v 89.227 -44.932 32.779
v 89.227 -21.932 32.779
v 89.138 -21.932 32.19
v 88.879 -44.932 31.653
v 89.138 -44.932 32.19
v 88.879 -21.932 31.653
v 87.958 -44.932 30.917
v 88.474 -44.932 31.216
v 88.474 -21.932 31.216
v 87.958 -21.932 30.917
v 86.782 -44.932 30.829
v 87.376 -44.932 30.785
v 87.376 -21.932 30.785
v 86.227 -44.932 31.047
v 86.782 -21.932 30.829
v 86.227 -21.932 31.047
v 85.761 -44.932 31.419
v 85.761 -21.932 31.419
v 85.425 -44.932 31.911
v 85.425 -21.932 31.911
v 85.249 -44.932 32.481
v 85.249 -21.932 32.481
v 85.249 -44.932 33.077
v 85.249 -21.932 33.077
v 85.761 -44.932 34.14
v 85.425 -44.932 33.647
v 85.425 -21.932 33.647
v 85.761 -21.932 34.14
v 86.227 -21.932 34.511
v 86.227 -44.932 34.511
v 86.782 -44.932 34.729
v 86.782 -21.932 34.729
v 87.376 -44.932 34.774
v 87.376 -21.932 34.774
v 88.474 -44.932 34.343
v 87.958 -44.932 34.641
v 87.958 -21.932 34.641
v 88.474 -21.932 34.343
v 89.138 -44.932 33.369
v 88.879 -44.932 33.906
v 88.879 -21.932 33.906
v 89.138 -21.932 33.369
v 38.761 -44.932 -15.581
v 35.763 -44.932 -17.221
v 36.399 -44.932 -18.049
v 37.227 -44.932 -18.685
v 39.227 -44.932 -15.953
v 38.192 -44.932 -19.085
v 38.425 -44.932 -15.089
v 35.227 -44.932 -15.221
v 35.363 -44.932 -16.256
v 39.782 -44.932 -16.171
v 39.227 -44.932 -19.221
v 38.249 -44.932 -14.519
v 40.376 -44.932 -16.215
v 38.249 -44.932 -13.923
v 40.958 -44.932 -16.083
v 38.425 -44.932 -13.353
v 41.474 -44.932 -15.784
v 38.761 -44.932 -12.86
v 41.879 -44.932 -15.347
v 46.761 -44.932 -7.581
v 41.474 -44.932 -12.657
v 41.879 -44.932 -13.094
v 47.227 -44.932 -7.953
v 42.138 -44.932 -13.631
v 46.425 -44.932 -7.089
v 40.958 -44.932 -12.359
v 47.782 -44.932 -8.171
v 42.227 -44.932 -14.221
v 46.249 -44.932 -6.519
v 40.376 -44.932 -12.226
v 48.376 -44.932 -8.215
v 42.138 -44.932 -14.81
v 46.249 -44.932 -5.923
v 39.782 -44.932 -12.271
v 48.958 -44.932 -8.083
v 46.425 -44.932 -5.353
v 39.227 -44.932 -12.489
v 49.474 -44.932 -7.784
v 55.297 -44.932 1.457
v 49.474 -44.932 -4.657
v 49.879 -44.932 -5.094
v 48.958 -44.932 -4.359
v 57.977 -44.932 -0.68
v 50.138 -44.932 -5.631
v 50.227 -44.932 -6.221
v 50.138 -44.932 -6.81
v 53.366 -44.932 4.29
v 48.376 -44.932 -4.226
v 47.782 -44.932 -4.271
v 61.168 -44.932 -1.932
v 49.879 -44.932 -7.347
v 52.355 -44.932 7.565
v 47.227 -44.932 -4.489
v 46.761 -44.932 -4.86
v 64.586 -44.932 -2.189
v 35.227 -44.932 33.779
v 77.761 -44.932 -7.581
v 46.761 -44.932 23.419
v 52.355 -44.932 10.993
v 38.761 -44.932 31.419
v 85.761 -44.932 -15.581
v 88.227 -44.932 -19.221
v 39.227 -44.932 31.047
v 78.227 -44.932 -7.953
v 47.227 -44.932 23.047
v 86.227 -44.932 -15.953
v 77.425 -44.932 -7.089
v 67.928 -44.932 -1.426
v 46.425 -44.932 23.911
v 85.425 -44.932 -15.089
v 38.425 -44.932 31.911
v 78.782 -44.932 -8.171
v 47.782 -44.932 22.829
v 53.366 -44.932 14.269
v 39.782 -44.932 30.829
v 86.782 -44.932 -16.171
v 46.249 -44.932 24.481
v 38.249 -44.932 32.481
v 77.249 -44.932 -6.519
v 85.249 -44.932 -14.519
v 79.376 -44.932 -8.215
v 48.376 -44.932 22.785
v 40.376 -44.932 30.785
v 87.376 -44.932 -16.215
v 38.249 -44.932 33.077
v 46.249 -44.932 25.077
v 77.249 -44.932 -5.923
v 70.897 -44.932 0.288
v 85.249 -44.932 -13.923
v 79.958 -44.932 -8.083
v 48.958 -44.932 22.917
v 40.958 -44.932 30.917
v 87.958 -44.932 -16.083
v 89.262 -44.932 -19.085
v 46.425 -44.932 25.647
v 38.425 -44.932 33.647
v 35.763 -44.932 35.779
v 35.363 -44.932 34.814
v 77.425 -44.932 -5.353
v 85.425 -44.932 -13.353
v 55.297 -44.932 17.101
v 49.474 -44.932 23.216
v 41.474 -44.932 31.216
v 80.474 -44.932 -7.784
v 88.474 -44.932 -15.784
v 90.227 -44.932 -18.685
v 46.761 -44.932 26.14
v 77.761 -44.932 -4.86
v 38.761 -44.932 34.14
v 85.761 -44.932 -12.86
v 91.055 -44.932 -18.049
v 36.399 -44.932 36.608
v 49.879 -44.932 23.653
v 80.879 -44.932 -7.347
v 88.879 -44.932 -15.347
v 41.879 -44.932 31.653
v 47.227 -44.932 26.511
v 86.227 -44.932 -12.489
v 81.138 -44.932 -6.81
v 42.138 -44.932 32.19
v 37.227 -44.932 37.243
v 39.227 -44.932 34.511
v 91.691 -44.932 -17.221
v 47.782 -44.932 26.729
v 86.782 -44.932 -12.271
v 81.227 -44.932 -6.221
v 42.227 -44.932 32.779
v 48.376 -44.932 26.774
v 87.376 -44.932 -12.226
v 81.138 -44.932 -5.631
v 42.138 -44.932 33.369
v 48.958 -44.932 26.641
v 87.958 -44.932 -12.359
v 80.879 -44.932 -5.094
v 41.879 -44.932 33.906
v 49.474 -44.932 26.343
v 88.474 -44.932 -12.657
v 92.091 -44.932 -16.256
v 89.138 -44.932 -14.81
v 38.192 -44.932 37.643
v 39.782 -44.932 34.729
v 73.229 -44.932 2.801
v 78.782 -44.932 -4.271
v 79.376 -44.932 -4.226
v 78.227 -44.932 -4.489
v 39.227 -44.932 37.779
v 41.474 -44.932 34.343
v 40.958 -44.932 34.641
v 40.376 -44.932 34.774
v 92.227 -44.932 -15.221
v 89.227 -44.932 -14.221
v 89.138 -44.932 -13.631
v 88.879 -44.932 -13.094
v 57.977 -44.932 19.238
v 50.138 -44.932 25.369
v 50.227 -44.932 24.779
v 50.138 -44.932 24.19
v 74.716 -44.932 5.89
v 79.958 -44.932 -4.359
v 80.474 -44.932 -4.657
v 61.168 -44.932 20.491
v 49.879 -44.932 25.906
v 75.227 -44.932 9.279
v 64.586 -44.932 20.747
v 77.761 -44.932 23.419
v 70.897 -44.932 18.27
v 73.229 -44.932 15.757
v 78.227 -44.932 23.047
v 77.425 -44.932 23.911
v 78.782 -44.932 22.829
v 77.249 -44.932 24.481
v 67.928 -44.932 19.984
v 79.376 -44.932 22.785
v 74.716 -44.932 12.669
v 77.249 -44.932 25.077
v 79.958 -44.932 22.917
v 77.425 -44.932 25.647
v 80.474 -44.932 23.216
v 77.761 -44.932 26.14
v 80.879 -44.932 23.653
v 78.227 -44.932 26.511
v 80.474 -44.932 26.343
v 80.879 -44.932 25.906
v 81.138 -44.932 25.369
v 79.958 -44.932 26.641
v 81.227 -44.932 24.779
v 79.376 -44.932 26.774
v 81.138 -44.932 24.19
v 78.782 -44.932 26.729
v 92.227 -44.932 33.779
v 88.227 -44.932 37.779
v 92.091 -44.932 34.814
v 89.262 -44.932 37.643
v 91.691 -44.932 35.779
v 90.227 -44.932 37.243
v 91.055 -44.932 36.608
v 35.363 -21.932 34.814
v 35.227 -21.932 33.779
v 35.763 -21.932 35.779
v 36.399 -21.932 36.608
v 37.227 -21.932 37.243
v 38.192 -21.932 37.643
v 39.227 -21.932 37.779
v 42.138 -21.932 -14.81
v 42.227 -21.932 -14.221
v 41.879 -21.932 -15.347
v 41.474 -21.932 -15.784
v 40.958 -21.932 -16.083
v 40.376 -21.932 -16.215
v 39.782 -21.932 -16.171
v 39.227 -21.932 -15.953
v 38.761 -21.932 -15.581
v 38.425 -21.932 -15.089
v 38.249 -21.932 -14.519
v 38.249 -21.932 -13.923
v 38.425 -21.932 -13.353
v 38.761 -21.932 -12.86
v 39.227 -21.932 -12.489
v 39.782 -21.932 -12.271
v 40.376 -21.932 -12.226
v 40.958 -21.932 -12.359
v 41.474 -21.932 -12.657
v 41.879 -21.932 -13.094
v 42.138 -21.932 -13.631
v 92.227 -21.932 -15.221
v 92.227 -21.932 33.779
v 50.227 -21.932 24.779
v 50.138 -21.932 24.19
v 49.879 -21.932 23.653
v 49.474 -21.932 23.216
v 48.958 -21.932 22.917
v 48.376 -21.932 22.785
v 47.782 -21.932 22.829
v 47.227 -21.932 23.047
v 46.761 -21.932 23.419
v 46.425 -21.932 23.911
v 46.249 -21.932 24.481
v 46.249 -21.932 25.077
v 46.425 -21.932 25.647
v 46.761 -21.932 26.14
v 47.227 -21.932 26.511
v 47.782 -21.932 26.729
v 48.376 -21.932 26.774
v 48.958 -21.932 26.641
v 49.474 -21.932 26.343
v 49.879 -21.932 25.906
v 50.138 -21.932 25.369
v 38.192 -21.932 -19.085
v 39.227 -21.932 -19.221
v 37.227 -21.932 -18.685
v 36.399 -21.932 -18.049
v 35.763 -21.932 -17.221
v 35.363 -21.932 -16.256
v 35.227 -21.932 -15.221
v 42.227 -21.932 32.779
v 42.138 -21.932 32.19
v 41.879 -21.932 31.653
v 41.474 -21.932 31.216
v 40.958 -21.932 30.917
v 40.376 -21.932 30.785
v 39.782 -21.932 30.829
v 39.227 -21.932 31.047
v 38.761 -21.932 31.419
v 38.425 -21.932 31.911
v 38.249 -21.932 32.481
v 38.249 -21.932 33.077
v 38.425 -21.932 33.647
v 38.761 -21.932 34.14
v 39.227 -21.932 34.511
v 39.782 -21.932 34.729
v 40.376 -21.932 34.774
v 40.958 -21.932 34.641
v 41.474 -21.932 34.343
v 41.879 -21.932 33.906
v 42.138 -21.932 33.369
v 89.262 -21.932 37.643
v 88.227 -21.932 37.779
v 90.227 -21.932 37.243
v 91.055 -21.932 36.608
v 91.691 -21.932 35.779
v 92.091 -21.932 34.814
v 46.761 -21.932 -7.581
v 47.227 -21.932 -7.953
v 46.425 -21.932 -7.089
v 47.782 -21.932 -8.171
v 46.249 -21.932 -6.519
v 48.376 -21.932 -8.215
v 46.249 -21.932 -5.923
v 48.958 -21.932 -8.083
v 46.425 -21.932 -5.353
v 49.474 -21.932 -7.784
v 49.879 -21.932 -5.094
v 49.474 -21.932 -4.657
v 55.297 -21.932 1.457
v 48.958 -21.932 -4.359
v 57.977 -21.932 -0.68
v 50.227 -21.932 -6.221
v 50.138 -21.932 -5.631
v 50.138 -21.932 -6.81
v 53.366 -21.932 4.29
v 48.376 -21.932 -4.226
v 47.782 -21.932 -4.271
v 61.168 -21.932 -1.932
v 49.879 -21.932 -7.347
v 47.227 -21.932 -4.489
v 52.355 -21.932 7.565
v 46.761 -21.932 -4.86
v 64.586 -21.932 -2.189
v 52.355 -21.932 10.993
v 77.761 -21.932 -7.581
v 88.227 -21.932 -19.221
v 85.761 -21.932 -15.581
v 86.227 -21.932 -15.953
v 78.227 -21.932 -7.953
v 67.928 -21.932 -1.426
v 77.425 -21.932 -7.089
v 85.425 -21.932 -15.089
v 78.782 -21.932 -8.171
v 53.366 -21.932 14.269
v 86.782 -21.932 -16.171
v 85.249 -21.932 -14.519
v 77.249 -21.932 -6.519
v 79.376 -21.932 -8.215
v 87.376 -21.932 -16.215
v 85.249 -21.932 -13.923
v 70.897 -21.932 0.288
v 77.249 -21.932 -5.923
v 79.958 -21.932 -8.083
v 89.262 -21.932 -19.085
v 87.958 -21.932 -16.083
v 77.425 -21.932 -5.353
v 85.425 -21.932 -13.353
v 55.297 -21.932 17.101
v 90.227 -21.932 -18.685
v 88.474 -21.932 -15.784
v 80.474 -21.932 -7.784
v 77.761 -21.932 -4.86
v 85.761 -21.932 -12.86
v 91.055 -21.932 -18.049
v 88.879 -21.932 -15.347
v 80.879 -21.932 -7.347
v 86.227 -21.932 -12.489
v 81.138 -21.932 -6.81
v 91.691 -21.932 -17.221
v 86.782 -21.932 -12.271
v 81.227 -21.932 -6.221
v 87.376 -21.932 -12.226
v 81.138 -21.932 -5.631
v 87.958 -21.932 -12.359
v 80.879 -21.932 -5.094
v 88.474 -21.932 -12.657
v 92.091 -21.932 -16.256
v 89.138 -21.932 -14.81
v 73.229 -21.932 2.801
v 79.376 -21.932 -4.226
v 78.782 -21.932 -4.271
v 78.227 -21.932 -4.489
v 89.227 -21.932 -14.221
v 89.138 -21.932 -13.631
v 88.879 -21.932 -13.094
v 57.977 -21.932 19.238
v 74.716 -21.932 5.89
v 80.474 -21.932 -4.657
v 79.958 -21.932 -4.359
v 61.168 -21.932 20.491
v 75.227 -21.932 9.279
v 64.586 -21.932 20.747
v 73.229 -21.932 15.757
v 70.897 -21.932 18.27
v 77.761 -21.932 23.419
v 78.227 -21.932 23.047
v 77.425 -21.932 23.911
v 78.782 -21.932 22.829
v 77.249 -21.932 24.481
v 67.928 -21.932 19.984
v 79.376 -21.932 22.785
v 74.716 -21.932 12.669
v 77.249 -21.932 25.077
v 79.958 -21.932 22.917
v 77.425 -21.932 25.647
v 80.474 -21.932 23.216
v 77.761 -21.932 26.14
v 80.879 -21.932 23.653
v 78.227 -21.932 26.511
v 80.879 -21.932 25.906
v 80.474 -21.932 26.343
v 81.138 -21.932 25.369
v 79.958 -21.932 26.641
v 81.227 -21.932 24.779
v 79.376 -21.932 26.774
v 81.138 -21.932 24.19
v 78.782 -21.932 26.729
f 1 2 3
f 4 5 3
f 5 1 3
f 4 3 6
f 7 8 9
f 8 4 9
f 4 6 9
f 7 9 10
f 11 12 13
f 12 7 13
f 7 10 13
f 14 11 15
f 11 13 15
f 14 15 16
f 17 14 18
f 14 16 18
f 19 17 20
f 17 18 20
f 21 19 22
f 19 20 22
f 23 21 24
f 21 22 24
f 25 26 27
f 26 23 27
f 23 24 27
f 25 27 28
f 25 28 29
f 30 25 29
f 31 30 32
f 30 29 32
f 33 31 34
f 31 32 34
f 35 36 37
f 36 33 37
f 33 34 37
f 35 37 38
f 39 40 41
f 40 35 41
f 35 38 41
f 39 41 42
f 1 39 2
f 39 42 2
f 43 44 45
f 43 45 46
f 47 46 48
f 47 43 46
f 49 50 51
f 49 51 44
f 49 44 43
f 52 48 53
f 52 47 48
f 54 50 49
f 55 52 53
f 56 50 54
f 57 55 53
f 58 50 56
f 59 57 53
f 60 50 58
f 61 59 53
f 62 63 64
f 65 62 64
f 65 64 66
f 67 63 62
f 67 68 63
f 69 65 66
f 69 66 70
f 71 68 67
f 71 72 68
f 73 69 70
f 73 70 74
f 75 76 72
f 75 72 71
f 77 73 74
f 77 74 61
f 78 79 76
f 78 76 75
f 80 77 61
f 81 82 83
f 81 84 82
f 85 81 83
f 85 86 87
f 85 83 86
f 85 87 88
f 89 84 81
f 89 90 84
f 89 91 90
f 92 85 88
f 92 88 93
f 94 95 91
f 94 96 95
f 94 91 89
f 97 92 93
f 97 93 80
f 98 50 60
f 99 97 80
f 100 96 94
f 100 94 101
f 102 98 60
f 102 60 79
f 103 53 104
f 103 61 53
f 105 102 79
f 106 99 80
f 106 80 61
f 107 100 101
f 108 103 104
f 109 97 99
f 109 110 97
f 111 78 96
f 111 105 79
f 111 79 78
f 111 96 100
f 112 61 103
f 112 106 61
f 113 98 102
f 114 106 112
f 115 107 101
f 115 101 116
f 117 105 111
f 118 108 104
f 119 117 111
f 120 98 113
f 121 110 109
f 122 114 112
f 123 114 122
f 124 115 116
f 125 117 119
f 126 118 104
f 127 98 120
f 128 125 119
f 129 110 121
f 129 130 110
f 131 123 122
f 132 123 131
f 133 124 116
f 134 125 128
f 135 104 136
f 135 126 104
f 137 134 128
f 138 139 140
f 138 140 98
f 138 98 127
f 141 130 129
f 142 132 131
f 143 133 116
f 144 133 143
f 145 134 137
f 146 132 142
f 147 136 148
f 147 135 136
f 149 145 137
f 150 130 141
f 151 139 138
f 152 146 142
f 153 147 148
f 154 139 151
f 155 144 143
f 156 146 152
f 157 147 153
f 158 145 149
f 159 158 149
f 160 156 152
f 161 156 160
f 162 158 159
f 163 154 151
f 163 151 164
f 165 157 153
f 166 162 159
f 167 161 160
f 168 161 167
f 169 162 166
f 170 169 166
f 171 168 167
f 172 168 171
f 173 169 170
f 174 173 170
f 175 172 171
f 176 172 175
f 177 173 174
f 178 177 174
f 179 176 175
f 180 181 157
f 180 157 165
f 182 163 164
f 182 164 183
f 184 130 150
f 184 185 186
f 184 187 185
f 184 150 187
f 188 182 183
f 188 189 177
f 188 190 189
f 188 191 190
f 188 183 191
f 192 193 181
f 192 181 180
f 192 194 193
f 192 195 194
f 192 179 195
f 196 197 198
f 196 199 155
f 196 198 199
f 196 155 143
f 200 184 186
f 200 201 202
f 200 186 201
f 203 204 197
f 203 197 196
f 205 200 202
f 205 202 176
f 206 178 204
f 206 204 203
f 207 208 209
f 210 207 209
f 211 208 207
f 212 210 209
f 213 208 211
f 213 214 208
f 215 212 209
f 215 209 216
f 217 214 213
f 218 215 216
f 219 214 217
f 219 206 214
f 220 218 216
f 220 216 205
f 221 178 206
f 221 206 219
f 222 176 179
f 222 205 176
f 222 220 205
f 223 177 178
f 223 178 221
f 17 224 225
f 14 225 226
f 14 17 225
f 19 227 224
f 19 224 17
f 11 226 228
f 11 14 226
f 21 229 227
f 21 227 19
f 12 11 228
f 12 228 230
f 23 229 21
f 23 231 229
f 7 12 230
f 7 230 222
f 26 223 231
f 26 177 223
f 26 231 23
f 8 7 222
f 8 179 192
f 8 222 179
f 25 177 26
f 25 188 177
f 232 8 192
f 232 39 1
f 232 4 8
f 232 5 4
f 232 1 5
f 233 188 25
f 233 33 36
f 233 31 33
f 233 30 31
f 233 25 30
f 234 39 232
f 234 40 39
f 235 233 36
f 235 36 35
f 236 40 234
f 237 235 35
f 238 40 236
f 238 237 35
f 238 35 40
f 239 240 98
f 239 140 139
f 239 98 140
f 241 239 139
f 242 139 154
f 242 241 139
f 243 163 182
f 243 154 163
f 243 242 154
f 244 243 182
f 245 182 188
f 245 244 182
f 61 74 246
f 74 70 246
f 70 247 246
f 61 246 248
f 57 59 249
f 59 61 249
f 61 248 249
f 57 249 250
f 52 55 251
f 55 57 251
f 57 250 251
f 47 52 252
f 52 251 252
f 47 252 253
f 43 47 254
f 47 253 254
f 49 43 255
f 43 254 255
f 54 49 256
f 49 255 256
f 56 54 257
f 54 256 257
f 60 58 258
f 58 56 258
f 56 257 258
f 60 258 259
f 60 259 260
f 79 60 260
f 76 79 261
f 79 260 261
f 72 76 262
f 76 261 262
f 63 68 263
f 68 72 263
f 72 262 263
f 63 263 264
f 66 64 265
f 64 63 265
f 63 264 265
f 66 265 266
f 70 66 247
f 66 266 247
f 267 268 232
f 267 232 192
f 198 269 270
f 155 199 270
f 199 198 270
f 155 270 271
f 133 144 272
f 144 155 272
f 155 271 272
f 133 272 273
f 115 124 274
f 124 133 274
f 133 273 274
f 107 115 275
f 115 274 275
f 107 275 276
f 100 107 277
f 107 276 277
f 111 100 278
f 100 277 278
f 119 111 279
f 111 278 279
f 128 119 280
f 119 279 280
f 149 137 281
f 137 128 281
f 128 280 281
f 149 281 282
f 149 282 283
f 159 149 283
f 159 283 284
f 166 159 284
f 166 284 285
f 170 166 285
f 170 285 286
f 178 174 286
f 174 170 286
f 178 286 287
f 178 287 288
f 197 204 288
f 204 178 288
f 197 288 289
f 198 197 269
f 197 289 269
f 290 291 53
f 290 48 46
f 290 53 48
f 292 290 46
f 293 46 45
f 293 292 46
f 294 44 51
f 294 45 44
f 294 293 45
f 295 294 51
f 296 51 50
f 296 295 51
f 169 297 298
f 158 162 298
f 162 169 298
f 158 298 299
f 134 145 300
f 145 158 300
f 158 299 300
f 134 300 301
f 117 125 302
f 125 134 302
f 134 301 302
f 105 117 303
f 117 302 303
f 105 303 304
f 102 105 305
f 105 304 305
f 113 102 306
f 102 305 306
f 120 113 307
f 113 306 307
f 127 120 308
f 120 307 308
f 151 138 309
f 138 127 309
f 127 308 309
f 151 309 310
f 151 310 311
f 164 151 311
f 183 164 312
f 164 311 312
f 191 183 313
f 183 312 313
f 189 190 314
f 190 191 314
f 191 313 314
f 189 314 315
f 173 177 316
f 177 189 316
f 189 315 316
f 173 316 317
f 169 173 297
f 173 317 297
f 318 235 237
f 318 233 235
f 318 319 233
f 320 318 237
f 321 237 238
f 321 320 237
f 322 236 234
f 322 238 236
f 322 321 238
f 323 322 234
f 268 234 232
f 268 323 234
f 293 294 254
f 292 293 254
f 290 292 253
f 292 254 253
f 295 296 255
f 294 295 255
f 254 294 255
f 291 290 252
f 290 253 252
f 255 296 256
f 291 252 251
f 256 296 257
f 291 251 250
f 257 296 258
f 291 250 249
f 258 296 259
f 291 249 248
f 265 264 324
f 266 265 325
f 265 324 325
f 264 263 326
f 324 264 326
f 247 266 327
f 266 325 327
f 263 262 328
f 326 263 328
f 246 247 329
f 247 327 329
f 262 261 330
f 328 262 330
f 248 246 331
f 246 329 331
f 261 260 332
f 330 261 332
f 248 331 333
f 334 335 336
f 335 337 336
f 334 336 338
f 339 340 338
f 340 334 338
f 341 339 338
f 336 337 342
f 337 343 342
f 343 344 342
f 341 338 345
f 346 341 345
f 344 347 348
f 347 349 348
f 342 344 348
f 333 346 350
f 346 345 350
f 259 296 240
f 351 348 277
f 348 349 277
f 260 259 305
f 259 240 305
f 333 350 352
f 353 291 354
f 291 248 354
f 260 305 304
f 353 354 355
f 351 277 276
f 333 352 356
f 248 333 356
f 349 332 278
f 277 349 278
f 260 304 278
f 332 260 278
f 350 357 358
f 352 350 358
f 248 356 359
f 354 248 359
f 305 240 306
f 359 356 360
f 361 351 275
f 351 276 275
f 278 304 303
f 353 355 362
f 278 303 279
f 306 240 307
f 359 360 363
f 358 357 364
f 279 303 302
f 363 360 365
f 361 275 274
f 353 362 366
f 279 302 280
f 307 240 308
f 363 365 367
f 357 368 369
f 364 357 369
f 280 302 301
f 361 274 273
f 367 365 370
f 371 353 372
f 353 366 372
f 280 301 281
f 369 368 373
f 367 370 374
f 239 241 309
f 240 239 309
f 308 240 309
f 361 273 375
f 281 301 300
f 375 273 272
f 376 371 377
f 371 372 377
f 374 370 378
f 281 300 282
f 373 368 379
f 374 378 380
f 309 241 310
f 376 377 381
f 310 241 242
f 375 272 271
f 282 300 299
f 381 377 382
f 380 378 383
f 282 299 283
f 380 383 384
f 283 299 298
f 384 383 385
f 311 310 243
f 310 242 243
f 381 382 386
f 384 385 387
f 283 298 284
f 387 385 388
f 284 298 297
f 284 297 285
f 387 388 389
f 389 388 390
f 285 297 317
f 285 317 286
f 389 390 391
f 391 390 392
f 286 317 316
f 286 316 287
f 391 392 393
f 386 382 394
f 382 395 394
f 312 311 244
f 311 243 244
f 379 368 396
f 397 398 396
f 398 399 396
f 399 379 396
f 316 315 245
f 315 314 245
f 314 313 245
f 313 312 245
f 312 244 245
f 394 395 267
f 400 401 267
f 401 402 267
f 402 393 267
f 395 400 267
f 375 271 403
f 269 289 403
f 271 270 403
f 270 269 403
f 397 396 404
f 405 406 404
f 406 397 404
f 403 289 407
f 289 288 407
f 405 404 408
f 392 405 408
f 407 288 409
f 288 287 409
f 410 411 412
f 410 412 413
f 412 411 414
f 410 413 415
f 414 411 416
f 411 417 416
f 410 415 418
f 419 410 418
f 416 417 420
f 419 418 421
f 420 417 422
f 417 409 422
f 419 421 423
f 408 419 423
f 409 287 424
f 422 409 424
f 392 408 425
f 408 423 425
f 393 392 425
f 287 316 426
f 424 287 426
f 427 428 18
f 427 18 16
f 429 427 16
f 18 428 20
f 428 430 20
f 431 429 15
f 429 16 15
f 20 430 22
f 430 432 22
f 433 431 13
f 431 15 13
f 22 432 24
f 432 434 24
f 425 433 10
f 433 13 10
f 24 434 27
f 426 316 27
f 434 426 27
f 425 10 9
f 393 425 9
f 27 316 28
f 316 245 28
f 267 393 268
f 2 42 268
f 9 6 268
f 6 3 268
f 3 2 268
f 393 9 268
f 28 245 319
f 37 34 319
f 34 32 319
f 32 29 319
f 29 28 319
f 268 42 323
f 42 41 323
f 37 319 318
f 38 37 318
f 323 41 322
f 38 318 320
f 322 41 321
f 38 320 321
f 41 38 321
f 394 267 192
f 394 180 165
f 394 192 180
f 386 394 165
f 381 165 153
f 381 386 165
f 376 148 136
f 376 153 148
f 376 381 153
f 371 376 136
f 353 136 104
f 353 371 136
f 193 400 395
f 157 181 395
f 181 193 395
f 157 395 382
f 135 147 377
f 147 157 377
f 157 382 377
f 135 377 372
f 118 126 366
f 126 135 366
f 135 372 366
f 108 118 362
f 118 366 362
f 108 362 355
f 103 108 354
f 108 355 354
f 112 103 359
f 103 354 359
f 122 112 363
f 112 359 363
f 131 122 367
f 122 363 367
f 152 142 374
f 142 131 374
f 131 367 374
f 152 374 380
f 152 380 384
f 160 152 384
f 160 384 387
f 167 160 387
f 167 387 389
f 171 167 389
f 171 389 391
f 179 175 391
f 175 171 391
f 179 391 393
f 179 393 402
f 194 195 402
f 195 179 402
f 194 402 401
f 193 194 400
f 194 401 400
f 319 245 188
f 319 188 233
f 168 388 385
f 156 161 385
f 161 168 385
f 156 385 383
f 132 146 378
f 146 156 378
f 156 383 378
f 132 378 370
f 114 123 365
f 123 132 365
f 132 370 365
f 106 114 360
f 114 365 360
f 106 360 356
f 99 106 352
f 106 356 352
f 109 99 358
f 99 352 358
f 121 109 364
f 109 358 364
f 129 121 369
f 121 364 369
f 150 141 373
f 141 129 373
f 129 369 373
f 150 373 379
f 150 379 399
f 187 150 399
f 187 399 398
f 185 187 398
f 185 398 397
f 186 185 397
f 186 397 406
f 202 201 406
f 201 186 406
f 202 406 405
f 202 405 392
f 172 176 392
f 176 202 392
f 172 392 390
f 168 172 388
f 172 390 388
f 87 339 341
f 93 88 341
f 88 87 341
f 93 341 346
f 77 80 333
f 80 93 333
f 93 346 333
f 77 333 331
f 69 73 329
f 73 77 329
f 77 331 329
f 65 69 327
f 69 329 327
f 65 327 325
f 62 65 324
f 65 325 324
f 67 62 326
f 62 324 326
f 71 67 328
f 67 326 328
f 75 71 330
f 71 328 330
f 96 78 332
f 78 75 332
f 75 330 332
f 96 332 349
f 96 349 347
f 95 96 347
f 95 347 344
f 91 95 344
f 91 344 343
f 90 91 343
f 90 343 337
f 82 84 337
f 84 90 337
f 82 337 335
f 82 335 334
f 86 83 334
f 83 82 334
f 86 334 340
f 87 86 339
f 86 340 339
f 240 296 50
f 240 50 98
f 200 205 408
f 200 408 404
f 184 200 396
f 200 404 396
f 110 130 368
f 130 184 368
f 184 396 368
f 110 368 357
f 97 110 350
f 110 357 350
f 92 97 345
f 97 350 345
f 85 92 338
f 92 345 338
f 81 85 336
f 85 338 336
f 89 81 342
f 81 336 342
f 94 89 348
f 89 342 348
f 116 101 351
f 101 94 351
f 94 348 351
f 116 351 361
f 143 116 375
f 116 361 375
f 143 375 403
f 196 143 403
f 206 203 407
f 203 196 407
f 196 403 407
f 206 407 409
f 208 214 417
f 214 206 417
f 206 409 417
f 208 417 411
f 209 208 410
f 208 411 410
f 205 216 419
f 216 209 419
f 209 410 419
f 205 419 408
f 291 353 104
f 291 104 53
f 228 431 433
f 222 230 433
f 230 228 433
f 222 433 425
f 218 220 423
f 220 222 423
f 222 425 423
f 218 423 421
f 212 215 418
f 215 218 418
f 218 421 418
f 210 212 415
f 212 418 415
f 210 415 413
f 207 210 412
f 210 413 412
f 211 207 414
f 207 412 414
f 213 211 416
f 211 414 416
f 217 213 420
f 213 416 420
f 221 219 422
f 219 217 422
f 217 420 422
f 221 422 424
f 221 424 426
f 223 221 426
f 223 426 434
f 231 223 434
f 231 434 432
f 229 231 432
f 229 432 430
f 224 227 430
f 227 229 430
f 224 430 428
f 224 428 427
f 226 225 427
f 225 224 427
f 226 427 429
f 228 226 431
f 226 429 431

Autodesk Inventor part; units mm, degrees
ref_plane "YZ Plane" through (0, 0, 0) normal (1, 0, 0) x (0, 1, 0)
ref_plane "XZ Plane" through (0, 0, 0) normal (0, 1, 0) x (-1, 0, 0)
ref_plane "XY Plane" through (0, 0, 0) normal (0, 0, 1) x (1, 0, 0)
ref_plane "Arbeitsebene1" through (63.727, -21.9316, 9.2792) normal (0, -1, 0) x (1, 0, 0)
sketch "Skizze1" plane through (63.727, -21.9316, 9.2792) normal (0, -1, 0) x (1, 0, 0)
  line L0 (-20.15, -16.7358) -> (-16.7358, -20.15) projected
  line L1 (-16.7358, -20.15) -> (16.7358, -20.15) projected
  line L2 (16.7358, -20.15) -> (20.15, -16.7358) projected
  line L3 (20.15, -16.7358) -> (20.15, 16.7358) projected
  line L4 (20.15, 16.7358) -> (16.7358, 20.15) projected
  line L5 (16.7358, 20.15) -> (-16.7358, 20.15) projected
  line L6 (-16.7358, 20.15) -> (-20.15, 16.7358) projected
  line L7 (-20.15, 16.7358) -> (-20.15, -16.7358) projected
  circle A0 centre (-15.5, -15.5) radius 2 projected
  circle A1 centre (15.5, -15.5) radius 2 projected
  circle A2 centre (15.5, 15.5) radius 2 projected
  circle A3 centre (-15.5, 15.5) radius 2 projected
  circle A4 centre (0, 0) radius 11.5 projected
  line L8 (24.5, -28.5) -> (-24.5, -28.5)
  line L9 (-28.5, -24.5) -> (-28.5, 24.5)
  line L10 (-24.5, 28.5) -> (24.5, 28.5)
  line L11 (28.5, 24.5) -> (28.5, -24.5)
  line L12 (28.5, -28.5) -> (-28.5, 28.5) construction
  line L13 (-28.5, -28.5) -> (28.5, 28.5) construction
  arc A5 (-24.5, 28.5) -> (-28.5, 24.5) centre (-24.5, 24.5) ccw
  arc A6 (28.5, 24.5) -> (24.5, 28.5) centre (24.5, 24.5) ccw
  arc A7 (24.5, -28.5) -> (28.5, -24.5) centre (24.5, -24.5) ccw
  arc A8 (-28.5, -24.5) -> (-24.5, -28.5) centre (-24.5, -24.5) ccw
  line L14 (23.5, -23.5) -> (-23.5, -23.5) construction
  line L15 (-23.5, -23.5) -> (-23.5, 23.5) construction
  line L16 (-23.5, 23.5) -> (23.5, 23.5) construction
  line L17 (23.5, 23.5) -> (23.5, -23.5) construction
  line L18 (23.5, -23.5) -> (-23.5, 23.5) construction
  line L19 (-23.5, -23.5) -> (23.5, 23.5) construction
  circle A9 centre (-23.5, 23.5) radius 2
  circle A10 centre (23.5, 23.5) radius 2
  circle A11 centre (23.5, -23.5) radius 2
  circle A12 centre (-23.5, -23.5) radius 2
  point P0 (-63.727, -9.2792)
  dimension "d0" = 57
  dimension "d1" = 57
  dimension "d2" = 4
  dimension "d3" = 47
  dimension "d4" = 47
  dimension "d5" = 4
  dimension "d6" = 4
  dimension "d7" = 4
  dimension "d8" = 4
extrude "Extrusion1" add sketch "Skizze1" along normal blind 23 contours L7 L6 L5 L4 L3 L2 L1 L0 | L8 A8 L9 A5 L10 A6 L11 A7
properties part number "00_NEMA17_Perestalticpump_Adapter"
